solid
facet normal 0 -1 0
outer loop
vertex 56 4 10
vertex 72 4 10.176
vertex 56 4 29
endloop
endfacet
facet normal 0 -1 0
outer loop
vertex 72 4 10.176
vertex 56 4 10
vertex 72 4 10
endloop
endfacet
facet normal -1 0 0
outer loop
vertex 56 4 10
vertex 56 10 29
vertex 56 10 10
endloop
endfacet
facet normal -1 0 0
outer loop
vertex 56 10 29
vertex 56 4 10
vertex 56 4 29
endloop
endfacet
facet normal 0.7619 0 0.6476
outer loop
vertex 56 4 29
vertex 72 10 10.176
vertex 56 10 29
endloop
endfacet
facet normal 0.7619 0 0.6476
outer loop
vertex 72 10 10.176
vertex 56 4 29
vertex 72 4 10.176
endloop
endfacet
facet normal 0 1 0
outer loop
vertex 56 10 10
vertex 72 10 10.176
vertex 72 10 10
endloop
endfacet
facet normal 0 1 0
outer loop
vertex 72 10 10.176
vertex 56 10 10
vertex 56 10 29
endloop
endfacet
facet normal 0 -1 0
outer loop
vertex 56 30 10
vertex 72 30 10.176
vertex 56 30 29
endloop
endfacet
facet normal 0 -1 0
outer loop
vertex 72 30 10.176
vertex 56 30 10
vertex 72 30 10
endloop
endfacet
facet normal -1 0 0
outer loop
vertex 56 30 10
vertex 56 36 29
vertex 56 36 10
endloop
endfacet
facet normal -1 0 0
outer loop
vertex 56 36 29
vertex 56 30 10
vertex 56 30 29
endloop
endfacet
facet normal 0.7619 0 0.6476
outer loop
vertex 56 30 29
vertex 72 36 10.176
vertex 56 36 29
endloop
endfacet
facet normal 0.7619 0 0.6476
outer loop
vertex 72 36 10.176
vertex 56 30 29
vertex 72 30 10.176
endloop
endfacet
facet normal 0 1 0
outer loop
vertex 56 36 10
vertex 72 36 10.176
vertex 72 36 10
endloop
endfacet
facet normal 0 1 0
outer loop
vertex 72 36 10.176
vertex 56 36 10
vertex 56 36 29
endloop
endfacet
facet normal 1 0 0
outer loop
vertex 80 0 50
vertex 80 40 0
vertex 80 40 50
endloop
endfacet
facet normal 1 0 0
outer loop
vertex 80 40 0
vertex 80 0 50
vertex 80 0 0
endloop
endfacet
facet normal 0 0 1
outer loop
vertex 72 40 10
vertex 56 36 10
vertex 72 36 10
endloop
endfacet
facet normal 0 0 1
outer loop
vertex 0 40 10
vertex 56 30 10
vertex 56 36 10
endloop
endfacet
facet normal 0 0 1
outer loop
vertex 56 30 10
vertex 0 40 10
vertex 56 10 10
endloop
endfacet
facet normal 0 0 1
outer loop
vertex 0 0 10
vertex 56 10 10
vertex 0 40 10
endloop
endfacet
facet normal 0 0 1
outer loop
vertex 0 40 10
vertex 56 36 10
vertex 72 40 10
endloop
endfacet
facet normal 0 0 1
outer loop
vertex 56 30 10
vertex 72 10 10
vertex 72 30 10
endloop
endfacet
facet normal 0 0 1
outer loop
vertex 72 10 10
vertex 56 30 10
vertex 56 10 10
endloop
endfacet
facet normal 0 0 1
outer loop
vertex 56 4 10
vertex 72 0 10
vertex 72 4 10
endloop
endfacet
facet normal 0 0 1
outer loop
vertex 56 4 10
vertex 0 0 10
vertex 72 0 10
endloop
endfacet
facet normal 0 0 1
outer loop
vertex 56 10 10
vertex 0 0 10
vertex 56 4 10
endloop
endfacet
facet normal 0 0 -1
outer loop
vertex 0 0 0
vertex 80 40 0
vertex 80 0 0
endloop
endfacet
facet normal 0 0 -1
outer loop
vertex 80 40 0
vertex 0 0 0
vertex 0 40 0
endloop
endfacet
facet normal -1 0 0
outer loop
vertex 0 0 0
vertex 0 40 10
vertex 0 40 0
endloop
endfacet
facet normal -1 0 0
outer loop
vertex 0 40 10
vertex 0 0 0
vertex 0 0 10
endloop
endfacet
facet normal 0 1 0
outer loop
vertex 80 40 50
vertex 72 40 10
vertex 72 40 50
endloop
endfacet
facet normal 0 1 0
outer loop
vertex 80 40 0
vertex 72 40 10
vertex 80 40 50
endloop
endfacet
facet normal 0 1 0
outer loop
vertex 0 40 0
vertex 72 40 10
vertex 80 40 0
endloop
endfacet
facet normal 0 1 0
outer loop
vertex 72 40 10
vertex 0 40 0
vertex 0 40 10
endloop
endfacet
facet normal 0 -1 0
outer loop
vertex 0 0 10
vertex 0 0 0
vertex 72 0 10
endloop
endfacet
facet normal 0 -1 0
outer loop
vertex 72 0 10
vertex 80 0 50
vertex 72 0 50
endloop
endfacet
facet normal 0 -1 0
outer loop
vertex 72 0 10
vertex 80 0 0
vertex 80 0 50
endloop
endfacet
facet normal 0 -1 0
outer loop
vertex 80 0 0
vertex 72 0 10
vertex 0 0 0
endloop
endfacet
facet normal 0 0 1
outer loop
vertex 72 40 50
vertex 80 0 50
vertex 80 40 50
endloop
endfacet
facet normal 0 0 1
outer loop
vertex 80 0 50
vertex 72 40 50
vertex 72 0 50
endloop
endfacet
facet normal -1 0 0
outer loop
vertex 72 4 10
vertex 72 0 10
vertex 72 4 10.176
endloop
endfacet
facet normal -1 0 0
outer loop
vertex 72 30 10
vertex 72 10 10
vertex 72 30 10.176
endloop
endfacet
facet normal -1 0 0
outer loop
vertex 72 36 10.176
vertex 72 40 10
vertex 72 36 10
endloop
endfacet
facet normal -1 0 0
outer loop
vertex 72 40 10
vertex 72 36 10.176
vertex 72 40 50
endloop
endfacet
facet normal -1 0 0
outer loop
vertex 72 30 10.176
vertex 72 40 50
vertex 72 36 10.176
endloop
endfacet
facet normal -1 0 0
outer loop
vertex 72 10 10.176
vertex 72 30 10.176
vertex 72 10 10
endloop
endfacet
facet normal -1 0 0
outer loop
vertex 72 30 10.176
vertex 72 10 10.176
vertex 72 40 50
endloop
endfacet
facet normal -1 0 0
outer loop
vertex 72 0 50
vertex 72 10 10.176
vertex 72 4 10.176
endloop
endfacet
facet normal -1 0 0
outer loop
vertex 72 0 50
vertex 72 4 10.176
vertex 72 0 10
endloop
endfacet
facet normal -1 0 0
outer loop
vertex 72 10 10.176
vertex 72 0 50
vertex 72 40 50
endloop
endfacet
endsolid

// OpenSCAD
$fn = 32;

// ----------------------------------------------------------------------
// Rib bracket: 2-gusset L bracket
// ----------------------------------------------------------------------

// --- parameters (mm) ---
base_l = 80;              // foot length, X
base_w = 40;              // foot width, Y
base_t = 10;              // foot thickness
plate_t = 8;              // upright plate thickness
plate_h = 50;             // overall height
gus_l = 16;               // gusset leg along the foot
gus_h = 20;               // gusset height
gus_t = 6;                // gusset thickness
gus_edge = 4;             // gusset margin from the foot edge
n_gus = 2;                // gusset count

gus_pitch = (base_w - 2 * gus_edge - gus_t) / (n_gus - 1);  // gusset pitch

union() {
  cube([base_l, base_w, base_t]);
  translate([base_l - plate_t, 0, base_t - 1])
    cube([plate_t, base_w, plate_h - base_t + 1]);
  for (i = [0 : n_gus - 1])
    translate([base_l - plate_t - gus_l, gus_edge + i * gus_pitch, base_t - 1])
      rotate([-90, 0, 0])
        linear_extrude(height = gus_t)
          polygon(points = [[0, 0], [gus_l + 1, 0], [0, -gus_h]]);
}
